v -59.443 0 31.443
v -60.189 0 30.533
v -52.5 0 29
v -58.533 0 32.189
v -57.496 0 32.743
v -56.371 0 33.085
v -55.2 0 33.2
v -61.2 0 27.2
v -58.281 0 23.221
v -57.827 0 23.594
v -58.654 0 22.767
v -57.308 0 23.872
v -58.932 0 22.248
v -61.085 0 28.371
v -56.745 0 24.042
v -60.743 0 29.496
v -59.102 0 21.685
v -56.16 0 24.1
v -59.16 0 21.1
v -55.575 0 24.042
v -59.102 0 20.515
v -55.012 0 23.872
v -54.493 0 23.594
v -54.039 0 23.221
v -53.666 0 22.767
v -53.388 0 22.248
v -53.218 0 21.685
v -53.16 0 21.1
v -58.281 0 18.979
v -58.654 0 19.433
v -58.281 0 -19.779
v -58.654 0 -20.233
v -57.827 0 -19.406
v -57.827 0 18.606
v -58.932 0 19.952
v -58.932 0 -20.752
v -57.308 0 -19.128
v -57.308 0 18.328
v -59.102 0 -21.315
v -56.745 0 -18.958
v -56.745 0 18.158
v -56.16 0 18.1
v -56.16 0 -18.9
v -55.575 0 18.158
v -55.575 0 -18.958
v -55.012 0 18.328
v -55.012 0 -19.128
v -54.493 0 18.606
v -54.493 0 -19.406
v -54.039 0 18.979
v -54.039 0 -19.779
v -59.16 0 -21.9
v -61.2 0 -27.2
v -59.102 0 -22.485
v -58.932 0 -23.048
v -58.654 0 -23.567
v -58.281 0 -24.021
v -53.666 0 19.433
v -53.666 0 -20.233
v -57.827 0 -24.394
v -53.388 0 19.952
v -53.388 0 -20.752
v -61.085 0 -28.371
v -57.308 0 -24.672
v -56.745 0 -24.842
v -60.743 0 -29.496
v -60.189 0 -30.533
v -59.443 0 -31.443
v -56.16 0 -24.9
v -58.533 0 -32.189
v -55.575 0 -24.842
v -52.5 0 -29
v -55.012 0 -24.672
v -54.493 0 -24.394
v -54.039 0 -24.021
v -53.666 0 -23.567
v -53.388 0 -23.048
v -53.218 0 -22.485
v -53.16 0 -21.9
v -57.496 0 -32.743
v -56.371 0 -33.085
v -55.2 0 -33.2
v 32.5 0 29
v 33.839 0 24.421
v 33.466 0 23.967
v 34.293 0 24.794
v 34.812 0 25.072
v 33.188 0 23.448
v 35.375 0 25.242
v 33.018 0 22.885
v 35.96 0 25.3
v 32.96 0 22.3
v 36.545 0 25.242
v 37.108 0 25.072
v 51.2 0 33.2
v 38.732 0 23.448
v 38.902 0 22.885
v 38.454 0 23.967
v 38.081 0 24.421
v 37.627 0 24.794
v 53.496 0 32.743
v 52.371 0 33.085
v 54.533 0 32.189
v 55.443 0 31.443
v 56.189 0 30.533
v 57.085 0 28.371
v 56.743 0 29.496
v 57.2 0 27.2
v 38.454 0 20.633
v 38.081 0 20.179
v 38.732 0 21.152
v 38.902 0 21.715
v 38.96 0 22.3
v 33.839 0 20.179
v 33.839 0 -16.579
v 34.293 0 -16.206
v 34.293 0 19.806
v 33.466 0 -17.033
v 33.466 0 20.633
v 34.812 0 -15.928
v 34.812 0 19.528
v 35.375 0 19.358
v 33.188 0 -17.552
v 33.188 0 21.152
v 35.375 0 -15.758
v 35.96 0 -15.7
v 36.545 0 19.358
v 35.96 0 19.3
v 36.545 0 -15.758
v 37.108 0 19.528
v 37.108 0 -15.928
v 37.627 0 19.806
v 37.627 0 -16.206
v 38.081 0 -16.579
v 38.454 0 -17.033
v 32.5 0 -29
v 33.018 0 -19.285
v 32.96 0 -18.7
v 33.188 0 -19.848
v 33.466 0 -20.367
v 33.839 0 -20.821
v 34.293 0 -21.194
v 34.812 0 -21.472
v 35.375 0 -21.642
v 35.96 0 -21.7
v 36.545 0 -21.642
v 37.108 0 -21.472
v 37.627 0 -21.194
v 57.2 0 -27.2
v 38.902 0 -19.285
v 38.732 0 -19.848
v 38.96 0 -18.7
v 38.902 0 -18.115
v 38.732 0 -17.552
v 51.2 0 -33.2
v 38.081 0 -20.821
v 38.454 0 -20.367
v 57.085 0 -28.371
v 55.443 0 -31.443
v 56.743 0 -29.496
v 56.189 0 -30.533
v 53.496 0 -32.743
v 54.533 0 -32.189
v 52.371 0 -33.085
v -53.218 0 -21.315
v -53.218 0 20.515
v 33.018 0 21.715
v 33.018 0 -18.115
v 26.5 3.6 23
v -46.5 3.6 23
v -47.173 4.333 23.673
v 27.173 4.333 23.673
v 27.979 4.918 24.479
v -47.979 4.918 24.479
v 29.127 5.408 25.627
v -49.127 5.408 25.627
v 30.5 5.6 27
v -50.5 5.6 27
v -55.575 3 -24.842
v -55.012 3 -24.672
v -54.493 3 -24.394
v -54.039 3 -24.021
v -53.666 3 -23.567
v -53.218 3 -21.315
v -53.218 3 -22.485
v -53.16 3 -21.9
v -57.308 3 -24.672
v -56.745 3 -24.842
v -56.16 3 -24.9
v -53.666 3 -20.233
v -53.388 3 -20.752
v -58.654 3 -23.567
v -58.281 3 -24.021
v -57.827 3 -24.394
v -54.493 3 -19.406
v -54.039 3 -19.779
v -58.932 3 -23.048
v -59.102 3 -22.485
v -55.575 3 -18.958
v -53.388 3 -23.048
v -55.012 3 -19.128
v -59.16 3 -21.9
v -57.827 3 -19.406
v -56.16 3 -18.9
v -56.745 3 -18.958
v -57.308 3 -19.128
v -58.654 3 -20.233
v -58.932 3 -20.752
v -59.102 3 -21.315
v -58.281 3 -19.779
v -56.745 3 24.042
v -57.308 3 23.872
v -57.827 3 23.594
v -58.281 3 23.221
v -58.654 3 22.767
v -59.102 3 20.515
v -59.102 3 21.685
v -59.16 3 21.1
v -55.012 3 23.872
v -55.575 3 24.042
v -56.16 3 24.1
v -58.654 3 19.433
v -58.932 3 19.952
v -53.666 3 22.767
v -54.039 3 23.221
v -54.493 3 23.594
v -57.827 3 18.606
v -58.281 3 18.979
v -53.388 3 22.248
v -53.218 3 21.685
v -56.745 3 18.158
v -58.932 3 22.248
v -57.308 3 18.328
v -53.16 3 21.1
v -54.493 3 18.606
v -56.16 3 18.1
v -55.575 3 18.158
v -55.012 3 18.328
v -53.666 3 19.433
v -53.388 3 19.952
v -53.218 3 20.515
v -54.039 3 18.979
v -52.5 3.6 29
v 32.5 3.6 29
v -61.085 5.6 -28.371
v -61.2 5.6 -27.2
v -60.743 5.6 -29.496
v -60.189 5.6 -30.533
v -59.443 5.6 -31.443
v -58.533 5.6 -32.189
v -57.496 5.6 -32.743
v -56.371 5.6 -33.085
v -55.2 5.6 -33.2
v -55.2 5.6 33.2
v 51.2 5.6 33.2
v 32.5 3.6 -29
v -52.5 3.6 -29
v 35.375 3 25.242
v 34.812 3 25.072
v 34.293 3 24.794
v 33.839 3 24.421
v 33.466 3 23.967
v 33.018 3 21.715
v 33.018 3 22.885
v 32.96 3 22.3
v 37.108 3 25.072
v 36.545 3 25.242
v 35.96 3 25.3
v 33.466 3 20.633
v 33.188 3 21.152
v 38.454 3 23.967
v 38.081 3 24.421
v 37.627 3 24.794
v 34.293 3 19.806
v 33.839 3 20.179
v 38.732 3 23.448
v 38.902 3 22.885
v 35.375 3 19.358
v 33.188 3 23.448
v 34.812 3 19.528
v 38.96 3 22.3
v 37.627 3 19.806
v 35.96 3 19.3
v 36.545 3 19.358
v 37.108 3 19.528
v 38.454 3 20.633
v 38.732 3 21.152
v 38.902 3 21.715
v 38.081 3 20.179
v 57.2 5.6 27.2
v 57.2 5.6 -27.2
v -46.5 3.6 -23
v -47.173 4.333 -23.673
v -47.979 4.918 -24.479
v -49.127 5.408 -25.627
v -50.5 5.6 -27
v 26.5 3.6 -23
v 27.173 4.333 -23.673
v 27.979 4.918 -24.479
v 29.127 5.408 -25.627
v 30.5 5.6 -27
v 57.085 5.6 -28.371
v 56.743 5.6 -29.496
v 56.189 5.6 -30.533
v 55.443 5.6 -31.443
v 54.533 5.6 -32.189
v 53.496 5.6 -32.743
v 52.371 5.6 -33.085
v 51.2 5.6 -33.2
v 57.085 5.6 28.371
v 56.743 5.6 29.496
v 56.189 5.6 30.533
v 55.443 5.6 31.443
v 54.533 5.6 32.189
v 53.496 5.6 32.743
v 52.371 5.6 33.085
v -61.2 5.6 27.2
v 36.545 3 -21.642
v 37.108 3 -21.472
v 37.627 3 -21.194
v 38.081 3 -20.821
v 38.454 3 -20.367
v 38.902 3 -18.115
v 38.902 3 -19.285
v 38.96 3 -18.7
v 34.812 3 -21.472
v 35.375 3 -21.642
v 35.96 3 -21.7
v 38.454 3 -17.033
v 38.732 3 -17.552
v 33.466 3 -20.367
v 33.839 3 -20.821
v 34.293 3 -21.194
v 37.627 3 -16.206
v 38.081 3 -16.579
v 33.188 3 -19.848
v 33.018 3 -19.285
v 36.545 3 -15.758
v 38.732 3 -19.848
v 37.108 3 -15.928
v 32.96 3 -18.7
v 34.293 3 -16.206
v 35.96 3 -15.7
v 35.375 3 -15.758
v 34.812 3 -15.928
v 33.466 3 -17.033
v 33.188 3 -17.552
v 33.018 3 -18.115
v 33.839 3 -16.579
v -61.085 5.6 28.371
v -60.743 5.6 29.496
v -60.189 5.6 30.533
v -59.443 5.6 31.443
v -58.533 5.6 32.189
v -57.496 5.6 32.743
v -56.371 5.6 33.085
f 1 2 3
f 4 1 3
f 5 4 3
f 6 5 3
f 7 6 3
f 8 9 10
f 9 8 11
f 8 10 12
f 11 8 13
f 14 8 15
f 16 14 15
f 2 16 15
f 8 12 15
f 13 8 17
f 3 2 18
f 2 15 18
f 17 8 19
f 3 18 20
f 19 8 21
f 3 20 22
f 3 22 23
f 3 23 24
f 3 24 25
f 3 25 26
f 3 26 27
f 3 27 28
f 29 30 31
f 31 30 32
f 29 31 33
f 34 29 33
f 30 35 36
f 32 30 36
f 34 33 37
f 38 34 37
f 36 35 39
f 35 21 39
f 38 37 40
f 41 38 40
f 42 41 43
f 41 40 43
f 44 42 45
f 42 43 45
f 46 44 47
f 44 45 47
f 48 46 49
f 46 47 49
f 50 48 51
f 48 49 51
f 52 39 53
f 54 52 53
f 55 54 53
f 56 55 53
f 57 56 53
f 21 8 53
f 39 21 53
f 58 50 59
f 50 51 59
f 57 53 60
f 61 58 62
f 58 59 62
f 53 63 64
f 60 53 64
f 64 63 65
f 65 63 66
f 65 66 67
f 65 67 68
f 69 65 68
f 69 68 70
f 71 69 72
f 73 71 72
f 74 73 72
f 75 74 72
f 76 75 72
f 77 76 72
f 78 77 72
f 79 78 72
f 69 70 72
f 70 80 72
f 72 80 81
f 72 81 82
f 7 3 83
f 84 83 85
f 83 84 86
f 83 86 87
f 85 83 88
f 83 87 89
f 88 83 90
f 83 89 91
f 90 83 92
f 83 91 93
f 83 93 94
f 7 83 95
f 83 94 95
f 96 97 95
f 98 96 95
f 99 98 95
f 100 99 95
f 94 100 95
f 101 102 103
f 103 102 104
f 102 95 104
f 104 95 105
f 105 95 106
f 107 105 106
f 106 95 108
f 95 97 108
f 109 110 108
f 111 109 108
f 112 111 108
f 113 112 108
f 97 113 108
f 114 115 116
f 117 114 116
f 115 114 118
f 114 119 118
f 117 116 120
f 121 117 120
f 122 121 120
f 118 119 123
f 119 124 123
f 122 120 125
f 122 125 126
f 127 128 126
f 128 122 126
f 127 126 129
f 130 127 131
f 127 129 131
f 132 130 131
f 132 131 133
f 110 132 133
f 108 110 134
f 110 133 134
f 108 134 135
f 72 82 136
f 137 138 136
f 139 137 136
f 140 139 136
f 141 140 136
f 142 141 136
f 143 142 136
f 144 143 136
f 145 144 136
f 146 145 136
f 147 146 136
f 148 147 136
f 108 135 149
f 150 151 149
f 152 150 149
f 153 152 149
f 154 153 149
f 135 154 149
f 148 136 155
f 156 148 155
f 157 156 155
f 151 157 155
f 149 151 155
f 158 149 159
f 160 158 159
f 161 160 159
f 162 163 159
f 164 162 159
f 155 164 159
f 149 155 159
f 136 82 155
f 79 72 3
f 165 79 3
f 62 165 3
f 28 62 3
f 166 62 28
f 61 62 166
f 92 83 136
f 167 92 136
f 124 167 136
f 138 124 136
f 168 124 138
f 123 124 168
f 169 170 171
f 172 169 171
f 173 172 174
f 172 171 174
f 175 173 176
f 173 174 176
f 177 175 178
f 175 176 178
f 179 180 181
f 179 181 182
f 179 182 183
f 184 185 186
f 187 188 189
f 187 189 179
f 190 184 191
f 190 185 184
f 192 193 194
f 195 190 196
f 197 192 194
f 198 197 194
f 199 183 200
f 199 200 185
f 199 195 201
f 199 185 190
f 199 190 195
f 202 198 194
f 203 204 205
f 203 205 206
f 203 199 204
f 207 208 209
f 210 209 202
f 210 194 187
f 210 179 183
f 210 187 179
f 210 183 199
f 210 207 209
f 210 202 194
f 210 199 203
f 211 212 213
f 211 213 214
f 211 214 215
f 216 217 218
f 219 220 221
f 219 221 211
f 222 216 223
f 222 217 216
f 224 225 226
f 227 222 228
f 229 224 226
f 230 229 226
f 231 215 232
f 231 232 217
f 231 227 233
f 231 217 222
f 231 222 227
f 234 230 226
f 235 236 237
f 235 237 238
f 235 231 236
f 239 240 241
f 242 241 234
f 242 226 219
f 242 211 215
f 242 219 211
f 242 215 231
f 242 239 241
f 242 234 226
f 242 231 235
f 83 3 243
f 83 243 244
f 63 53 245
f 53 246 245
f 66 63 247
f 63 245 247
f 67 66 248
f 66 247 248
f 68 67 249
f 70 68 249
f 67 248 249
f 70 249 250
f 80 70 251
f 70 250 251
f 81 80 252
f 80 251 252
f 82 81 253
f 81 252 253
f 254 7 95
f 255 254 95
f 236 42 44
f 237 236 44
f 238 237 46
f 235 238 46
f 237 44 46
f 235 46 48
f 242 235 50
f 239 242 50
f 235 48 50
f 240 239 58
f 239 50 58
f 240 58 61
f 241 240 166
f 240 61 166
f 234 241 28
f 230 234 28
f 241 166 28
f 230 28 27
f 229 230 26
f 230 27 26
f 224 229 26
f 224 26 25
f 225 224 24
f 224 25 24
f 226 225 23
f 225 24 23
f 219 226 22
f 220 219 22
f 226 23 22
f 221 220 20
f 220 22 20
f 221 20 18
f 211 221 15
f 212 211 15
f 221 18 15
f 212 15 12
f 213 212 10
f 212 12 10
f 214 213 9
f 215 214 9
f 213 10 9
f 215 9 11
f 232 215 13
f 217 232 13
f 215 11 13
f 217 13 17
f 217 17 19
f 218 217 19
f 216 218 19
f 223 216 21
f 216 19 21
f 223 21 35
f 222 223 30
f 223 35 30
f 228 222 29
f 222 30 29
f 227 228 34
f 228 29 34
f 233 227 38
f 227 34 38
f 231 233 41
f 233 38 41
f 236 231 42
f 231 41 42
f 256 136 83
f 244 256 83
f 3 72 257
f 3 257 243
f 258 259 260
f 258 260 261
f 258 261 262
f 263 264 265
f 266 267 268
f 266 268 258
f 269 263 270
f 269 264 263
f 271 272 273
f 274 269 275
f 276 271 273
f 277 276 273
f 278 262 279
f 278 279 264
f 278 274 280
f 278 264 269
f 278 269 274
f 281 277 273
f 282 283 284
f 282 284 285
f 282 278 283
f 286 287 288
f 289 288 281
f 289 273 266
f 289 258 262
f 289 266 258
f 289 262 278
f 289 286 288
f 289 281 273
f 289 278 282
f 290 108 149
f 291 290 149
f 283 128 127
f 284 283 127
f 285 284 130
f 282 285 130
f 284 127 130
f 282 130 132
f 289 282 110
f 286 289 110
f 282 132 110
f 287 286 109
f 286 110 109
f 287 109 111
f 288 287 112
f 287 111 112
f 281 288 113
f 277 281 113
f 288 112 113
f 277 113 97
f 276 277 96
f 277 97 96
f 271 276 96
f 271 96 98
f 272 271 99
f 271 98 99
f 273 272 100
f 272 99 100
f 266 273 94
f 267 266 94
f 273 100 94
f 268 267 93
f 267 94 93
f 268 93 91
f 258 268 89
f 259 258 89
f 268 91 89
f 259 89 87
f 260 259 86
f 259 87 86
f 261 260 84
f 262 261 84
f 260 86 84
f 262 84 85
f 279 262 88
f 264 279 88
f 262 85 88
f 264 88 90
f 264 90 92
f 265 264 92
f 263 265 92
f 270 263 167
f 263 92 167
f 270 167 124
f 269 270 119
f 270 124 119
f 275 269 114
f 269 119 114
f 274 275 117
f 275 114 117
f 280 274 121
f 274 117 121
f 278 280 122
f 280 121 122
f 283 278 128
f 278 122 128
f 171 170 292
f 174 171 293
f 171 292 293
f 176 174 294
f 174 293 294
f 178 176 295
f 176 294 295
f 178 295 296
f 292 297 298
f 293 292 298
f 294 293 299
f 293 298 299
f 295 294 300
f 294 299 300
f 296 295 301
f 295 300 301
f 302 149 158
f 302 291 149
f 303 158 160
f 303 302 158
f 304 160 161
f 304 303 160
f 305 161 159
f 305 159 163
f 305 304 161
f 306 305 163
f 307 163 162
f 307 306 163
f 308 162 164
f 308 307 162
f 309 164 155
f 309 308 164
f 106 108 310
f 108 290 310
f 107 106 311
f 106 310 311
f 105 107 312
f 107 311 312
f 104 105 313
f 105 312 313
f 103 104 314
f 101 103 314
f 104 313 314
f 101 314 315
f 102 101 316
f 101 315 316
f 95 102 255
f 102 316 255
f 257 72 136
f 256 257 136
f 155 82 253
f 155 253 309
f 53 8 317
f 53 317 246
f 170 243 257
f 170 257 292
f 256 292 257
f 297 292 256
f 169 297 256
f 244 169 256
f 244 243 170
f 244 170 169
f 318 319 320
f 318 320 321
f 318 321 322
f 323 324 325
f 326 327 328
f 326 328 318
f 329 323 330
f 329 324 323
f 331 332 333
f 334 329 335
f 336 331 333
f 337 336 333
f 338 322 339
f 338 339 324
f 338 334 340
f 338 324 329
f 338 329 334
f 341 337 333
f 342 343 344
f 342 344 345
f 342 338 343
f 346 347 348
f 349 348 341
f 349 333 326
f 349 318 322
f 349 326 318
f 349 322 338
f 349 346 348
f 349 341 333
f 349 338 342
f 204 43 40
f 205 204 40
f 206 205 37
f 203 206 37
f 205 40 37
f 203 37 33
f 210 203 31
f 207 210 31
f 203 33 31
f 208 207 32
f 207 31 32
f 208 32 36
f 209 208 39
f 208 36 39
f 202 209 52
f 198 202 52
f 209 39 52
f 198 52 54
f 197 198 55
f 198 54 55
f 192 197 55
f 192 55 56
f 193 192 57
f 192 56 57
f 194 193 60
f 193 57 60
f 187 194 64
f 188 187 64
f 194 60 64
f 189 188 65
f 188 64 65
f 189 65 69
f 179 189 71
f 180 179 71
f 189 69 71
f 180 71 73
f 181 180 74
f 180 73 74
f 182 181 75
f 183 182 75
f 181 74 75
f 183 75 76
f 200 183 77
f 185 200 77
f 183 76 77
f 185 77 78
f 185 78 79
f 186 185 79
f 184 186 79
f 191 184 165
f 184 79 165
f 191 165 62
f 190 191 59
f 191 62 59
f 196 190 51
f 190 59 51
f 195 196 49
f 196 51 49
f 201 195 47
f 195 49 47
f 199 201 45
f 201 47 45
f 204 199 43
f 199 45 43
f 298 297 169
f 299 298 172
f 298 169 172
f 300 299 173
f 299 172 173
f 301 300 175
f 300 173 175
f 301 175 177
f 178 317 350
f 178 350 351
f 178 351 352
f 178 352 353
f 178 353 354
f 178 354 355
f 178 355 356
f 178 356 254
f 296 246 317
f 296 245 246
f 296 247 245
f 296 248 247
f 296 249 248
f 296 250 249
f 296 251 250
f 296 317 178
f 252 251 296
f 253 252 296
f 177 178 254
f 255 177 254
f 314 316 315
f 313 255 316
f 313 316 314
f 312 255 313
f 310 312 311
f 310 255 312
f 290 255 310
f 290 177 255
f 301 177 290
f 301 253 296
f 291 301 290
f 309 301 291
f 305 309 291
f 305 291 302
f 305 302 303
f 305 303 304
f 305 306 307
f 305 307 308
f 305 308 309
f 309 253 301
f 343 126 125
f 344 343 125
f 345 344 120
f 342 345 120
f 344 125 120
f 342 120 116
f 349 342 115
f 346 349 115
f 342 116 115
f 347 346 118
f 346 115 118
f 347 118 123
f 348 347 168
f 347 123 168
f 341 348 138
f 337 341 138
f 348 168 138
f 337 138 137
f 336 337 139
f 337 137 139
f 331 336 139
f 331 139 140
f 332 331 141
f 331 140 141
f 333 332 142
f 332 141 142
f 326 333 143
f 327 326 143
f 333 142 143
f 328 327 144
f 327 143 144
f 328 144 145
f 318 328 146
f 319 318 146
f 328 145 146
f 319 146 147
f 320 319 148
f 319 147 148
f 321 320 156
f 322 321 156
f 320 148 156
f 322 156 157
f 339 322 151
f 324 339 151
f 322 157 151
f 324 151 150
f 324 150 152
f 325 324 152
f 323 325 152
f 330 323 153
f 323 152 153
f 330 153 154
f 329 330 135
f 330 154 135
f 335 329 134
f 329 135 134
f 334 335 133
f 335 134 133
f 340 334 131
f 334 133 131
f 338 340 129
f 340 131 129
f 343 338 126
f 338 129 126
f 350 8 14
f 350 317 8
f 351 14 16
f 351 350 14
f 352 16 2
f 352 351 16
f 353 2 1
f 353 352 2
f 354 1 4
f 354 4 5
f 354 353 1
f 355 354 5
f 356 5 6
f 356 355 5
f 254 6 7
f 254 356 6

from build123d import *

# Parameters (mm, degrees)
SKETCH_1_W            = 118.4
SKETCH_1_H            = 66.4
EXTRUDE_1_DEPTH       = 5.6
SKETCH_5_R            = 3
CUT_EXTRUDE_961_DEPTH = 3
SKETCH_7_W            = 85
SKETCH_7_H            = 58
LCD_DEPTH             = 3.6
SKETCH_13_W           = 73
SKETCH_13_H           = 46
CUT_EXTRUDE_1_DEPTH   = 10
FILLET_2_R            = 5
FILLET_3_R            = 6


with BuildPart() as part:
    # Эскиз1 → Бобышка-Вытянуть1 (new body)
    with BuildSketch(Plane(origin=(0, 0, 0), x_dir=(1, 0, 0), z_dir=(0, 1, 0))):
        with Locations((-2, 0)):
            Rectangle(SKETCH_1_W, SKETCH_1_H)
    extrude(amount=EXTRUDE_1_DEPTH)

    # Эскиз5 → Cut-Extrude 961 (cut)
    with BuildSketch(Plane.XZ):
        with Locations(Location((-56.16, 21.1, 0), (0, 0, 270))):
            Circle(SKETCH_5_R)
        with Locations(Location((-56.16, -21.9, 0), (0, 0, 90))):
            Circle(SKETCH_5_R)
        with Locations(Location((35.96, 22.3, 0), (0, 0, 270))):
            Circle(SKETCH_5_R)
        with Locations(Location((35.96, -18.7, 0), (0, 0, 90))):
            Circle(SKETCH_5_R)
    extrude(amount=-CUT_EXTRUDE_961_DEPTH, mode=Mode.SUBTRACT)

    # Эскиз7 → под LCD (cut)
    with BuildSketch(Plane.XZ):
        with Locations((-10, 0)):
            Rectangle(SKETCH_7_W, SKETCH_7_H)
    extrude(amount=-LCD_DEPTH, mode=Mode.SUBTRACT)

    # Эскиз13 → Вырез-Вытянуть1 (cut)
    with BuildSketch(Plane.XZ.offset(-3.6)):
        with Locations((-10, 0)):
            Rectangle(SKETCH_13_W, SKETCH_13_H)
    extrude(amount=-CUT_EXTRUDE_1_DEPTH, mode=Mode.SUBTRACT)

    # Скругление2
    # the kernel refuses this fillet: 5 mm, written as the material it takes off along each edge
    with BuildSketch(Plane(origin=(-46.5, 5.6, -23), x_dir=(-1, 0, 0), z_dir=(0, 0, 1)), Plane(origin=(26.5, 5.6, 23), x_dir=(1, 0, 0), z_dir=(0, 0, -1))) as fillet_2_piece_1:
        with BuildLine():
            CenterArc((4, 5), FILLET_2_R, 216.869897646, 53.130102354)
            Line((0, 2), (-0.08, 1.94))
            ThreePointArc((-0.08, 1.94), (-0.1, 1), (-0.1, 0))
            Line((-0.1, 0), (0, -0.1))
            Line((0, -0.1), (4, -0.1))
            Line((4, -0.1), (4, 0))
        make_face()
    extrude(amount=46, mode=Mode.SUBTRACT)
    with BuildSketch(Plane(origin=(-46.5, 5.6, 23), x_dir=(0, 0, 1), z_dir=(1, 0, 0)), Plane(origin=(26.5, 5.6, -23), x_dir=(0, 0, -1), z_dir=(-1, 0, 0))) as fillet_2_piece_2:
        with BuildLine():
            CenterArc((4, 5), FILLET_2_R, 216.869897646, 53.130102354)
            Line((0, 2), (-0.08, 1.94))
            ThreePointArc((-0.08, 1.94), (-0.1, 1), (-0.1, 0))
            Line((-0.1, 0), (0, -0.1))
            Line((0, -0.1), (4, -0.1))
            Line((4, -0.1), (4, 0))
        make_face()
    extrude(amount=73, mode=Mode.SUBTRACT)
    with BuildSketch(Plane(origin=(-46.5, 5.6, -33), x_dir=(-1, 0, 0), z_dir=(0, 0, 1))) as fillet_2_piece_3a_section:
        with BuildLine():
            CenterArc((4, 5), FILLET_2_R, 216.869897646, 53.130102354)
            Line((0, 2), (-0.08, 1.94))
            ThreePointArc((-0.08, 1.94), (-0.1, 1), (-0.1, 0))
            Line((-0.1, 0), (0, -0.1))
            Line((0, -0.1), (4, -0.1))
            Line((4, -0.1), (4, 0))
        make_face()
    fillet_2_piece_3a = extrude(amount=56, mode=Mode.PRIVATE)
    fillet_2_piece_3a = split(fillet_2_piece_3a, bisect_by=Plane(origin=(-47.529417057, 5.088057438, -23), z_dir=(0, 0, -1)), keep=Keep.TOP, mode=Mode.PRIVATE)
    with BuildSketch(Plane(origin=(26.5, 5.6, -23), x_dir=(0, 0, -1), z_dir=(-1, 0, 0))) as fillet_2_piece_3b_section:
        with BuildLine():
            CenterArc((4, 5), FILLET_2_R, 216.869897646, 53.130102354)
            Line((0, 2), (-0.08, 1.94))
            ThreePointArc((-0.08, 1.94), (-0.1, 1), (-0.1, 0))
            Line((-0.1, 0), (0, -0.1))
            Line((0, -0.1), (4, -0.1))
            Line((4, -0.1), (4, 0))
        make_face()
    fillet_2_piece_3b = extrude(amount=83, mode=Mode.PRIVATE)
    fillet_2_piece_3b = split(fillet_2_piece_3b, bisect_by=Plane(origin=(-46.5, 5.088057438, -24.029417057), z_dir=(-1, 0, 0)), keep=Keep.TOP, mode=Mode.PRIVATE)
    fillet_2_piece_3 = fillet_2_piece_3a & fillet_2_piece_3b
    add(fillet_2_piece_3, mode=Mode.SUBTRACT)
    with BuildSketch(Plane(origin=(-46.5, 5.6, -23), x_dir=(-1, 0, 0), z_dir=(0, 0, 1))) as fillet_2_piece_4a_section:
        with BuildLine():
            CenterArc((4, 5), FILLET_2_R, 216.869897646, 53.130102354)
            Line((0, 2), (-0.08, 1.94))
            ThreePointArc((-0.08, 1.94), (-0.1, 1), (-0.1, 0))
            Line((-0.1, 0), (0, -0.1))
            Line((0, -0.1), (4, -0.1))
            Line((4, -0.1), (4, 0))
        make_face()
    fillet_2_piece_4a = extrude(amount=56, mode=Mode.PRIVATE)
    fillet_2_piece_4a = split(fillet_2_piece_4a, bisect_by=Plane(origin=(-47.529417057, 5.088057438, 23), z_dir=(0, 0, 1)), keep=Keep.TOP, mode=Mode.PRIVATE)
    with BuildSketch(Plane(origin=(-56.5, 5.6, 23), x_dir=(0, 0, 1), z_dir=(1, 0, 0))) as fillet_2_piece_4b_section:
        with BuildLine():
            CenterArc((4, 5), FILLET_2_R, 216.869897646, 53.130102354)
            Line((0, 2), (-0.08, 1.94))
            ThreePointArc((-0.08, 1.94), (-0.1, 1), (-0.1, 0))
            Line((-0.1, 0), (0, -0.1))
            Line((0, -0.1), (4, -0.1))
            Line((4, -0.1), (4, 0))
        make_face()
    fillet_2_piece_4b = extrude(amount=83, mode=Mode.PRIVATE)
    fillet_2_piece_4b = split(fillet_2_piece_4b, bisect_by=Plane(origin=(-46.5, 5.088057438, 24.029417057), z_dir=(-1, 0, 0)), keep=Keep.TOP, mode=Mode.PRIVATE)
    fillet_2_piece_4 = fillet_2_piece_4a & fillet_2_piece_4b
    add(fillet_2_piece_4, mode=Mode.SUBTRACT)
    with BuildSketch(Plane(origin=(26.5, 5.6, 33), x_dir=(1, 0, 0), z_dir=(0, 0, -1))) as fillet_2_piece_5a_section:
        with BuildLine():
            CenterArc((4, 5), FILLET_2_R, 216.869897646, 53.130102354)
            Line((0, 2), (-0.08, 1.94))
            ThreePointArc((-0.08, 1.94), (-0.1, 1), (-0.1, 0))
            Line((-0.1, 0), (0, -0.1))
            Line((0, -0.1), (4, -0.1))
            Line((4, -0.1), (4, 0))
        make_face()
    fillet_2_piece_5a = extrude(amount=56, mode=Mode.PRIVATE)
    fillet_2_piece_5a = split(fillet_2_piece_5a, bisect_by=Plane(origin=(27.529417057, 5.088057438, 23), z_dir=(0, 0, 1)), keep=Keep.TOP, mode=Mode.PRIVATE)
    with BuildSketch(Plane(origin=(-46.5, 5.6, 23), x_dir=(0, 0, 1), z_dir=(1, 0, 0))) as fillet_2_piece_5b_section:
        with BuildLine():
            CenterArc((4, 5), FILLET_2_R, 216.869897646, 53.130102354)
            Line((0, 2), (-0.08, 1.94))
            ThreePointArc((-0.08, 1.94), (-0.1, 1), (-0.1, 0))
            Line((-0.1, 0), (0, -0.1))
            Line((0, -0.1), (4, -0.1))
            Line((4, -0.1), (4, 0))
        make_face()
    fillet_2_piece_5b = extrude(amount=83, mode=Mode.PRIVATE)
    fillet_2_piece_5b = split(fillet_2_piece_5b, bisect_by=Plane(origin=(26.5, 5.088057438, 24.029417057), z_dir=(1, 0, 0)), keep=Keep.TOP, mode=Mode.PRIVATE)
    fillet_2_piece_5 = fillet_2_piece_5a & fillet_2_piece_5b
    add(fillet_2_piece_5, mode=Mode.SUBTRACT)
    with BuildSketch(Plane(origin=(36.5, 5.6, -23), x_dir=(0, 0, -1), z_dir=(-1, 0, 0))) as fillet_2_piece_6a_section:
        with BuildLine():
            CenterArc((4, 5), FILLET_2_R, 216.869897646, 53.130102354)
            Line((0, 2), (-0.08, 1.94))
            ThreePointArc((-0.08, 1.94), (-0.1, 1), (-0.1, 0))
            Line((-0.1, 0), (0, -0.1))
            Line((0, -0.1), (4, -0.1))
            Line((4, -0.1), (4, 0))
        make_face()
    fillet_2_piece_6a = extrude(amount=83, mode=Mode.PRIVATE)
    fillet_2_piece_6a = split(fillet_2_piece_6a, bisect_by=Plane(origin=(26.5, 5.088057438, -24.029417057), z_dir=(1, 0, 0)), keep=Keep.TOP, mode=Mode.PRIVATE)
    with BuildSketch(Plane(origin=(26.5, 5.6, 23), x_dir=(1, 0, 0), z_dir=(0, 0, -1))) as fillet_2_piece_6b_section:
        with BuildLine():
            CenterArc((4, 5), FILLET_2_R, 216.869897646, 53.130102354)
            Line((0, 2), (-0.08, 1.94))
            ThreePointArc((-0.08, 1.94), (-0.1, 1), (-0.1, 0))
            Line((-0.1, 0), (0, -0.1))
            Line((0, -0.1), (4, -0.1))
            Line((4, -0.1), (4, 0))
        make_face()
    fillet_2_piece_6b = extrude(amount=56, mode=Mode.PRIVATE)
    fillet_2_piece_6b = split(fillet_2_piece_6b, bisect_by=Plane(origin=(27.529417057, 5.088057438, -23), z_dir=(0, 0, -1)), keep=Keep.TOP, mode=Mode.PRIVATE)
    fillet_2_piece_6 = fillet_2_piece_6a & fillet_2_piece_6b
    add(fillet_2_piece_6, mode=Mode.SUBTRACT)

    # Скругление3
    fillet_3_edges = [part.edges().sort_by_distance(p)[0] for p in [
        (-61.2, 2.8, -33.2),
        (57.2, 2.8, -33.2),
        (57.2, 2.8, 33.2),
        (-61.2, 2.8, 33.2),
    ]]
    fillet(fillet_3_edges, radius=FILLET_3_R)


solid = part.part
